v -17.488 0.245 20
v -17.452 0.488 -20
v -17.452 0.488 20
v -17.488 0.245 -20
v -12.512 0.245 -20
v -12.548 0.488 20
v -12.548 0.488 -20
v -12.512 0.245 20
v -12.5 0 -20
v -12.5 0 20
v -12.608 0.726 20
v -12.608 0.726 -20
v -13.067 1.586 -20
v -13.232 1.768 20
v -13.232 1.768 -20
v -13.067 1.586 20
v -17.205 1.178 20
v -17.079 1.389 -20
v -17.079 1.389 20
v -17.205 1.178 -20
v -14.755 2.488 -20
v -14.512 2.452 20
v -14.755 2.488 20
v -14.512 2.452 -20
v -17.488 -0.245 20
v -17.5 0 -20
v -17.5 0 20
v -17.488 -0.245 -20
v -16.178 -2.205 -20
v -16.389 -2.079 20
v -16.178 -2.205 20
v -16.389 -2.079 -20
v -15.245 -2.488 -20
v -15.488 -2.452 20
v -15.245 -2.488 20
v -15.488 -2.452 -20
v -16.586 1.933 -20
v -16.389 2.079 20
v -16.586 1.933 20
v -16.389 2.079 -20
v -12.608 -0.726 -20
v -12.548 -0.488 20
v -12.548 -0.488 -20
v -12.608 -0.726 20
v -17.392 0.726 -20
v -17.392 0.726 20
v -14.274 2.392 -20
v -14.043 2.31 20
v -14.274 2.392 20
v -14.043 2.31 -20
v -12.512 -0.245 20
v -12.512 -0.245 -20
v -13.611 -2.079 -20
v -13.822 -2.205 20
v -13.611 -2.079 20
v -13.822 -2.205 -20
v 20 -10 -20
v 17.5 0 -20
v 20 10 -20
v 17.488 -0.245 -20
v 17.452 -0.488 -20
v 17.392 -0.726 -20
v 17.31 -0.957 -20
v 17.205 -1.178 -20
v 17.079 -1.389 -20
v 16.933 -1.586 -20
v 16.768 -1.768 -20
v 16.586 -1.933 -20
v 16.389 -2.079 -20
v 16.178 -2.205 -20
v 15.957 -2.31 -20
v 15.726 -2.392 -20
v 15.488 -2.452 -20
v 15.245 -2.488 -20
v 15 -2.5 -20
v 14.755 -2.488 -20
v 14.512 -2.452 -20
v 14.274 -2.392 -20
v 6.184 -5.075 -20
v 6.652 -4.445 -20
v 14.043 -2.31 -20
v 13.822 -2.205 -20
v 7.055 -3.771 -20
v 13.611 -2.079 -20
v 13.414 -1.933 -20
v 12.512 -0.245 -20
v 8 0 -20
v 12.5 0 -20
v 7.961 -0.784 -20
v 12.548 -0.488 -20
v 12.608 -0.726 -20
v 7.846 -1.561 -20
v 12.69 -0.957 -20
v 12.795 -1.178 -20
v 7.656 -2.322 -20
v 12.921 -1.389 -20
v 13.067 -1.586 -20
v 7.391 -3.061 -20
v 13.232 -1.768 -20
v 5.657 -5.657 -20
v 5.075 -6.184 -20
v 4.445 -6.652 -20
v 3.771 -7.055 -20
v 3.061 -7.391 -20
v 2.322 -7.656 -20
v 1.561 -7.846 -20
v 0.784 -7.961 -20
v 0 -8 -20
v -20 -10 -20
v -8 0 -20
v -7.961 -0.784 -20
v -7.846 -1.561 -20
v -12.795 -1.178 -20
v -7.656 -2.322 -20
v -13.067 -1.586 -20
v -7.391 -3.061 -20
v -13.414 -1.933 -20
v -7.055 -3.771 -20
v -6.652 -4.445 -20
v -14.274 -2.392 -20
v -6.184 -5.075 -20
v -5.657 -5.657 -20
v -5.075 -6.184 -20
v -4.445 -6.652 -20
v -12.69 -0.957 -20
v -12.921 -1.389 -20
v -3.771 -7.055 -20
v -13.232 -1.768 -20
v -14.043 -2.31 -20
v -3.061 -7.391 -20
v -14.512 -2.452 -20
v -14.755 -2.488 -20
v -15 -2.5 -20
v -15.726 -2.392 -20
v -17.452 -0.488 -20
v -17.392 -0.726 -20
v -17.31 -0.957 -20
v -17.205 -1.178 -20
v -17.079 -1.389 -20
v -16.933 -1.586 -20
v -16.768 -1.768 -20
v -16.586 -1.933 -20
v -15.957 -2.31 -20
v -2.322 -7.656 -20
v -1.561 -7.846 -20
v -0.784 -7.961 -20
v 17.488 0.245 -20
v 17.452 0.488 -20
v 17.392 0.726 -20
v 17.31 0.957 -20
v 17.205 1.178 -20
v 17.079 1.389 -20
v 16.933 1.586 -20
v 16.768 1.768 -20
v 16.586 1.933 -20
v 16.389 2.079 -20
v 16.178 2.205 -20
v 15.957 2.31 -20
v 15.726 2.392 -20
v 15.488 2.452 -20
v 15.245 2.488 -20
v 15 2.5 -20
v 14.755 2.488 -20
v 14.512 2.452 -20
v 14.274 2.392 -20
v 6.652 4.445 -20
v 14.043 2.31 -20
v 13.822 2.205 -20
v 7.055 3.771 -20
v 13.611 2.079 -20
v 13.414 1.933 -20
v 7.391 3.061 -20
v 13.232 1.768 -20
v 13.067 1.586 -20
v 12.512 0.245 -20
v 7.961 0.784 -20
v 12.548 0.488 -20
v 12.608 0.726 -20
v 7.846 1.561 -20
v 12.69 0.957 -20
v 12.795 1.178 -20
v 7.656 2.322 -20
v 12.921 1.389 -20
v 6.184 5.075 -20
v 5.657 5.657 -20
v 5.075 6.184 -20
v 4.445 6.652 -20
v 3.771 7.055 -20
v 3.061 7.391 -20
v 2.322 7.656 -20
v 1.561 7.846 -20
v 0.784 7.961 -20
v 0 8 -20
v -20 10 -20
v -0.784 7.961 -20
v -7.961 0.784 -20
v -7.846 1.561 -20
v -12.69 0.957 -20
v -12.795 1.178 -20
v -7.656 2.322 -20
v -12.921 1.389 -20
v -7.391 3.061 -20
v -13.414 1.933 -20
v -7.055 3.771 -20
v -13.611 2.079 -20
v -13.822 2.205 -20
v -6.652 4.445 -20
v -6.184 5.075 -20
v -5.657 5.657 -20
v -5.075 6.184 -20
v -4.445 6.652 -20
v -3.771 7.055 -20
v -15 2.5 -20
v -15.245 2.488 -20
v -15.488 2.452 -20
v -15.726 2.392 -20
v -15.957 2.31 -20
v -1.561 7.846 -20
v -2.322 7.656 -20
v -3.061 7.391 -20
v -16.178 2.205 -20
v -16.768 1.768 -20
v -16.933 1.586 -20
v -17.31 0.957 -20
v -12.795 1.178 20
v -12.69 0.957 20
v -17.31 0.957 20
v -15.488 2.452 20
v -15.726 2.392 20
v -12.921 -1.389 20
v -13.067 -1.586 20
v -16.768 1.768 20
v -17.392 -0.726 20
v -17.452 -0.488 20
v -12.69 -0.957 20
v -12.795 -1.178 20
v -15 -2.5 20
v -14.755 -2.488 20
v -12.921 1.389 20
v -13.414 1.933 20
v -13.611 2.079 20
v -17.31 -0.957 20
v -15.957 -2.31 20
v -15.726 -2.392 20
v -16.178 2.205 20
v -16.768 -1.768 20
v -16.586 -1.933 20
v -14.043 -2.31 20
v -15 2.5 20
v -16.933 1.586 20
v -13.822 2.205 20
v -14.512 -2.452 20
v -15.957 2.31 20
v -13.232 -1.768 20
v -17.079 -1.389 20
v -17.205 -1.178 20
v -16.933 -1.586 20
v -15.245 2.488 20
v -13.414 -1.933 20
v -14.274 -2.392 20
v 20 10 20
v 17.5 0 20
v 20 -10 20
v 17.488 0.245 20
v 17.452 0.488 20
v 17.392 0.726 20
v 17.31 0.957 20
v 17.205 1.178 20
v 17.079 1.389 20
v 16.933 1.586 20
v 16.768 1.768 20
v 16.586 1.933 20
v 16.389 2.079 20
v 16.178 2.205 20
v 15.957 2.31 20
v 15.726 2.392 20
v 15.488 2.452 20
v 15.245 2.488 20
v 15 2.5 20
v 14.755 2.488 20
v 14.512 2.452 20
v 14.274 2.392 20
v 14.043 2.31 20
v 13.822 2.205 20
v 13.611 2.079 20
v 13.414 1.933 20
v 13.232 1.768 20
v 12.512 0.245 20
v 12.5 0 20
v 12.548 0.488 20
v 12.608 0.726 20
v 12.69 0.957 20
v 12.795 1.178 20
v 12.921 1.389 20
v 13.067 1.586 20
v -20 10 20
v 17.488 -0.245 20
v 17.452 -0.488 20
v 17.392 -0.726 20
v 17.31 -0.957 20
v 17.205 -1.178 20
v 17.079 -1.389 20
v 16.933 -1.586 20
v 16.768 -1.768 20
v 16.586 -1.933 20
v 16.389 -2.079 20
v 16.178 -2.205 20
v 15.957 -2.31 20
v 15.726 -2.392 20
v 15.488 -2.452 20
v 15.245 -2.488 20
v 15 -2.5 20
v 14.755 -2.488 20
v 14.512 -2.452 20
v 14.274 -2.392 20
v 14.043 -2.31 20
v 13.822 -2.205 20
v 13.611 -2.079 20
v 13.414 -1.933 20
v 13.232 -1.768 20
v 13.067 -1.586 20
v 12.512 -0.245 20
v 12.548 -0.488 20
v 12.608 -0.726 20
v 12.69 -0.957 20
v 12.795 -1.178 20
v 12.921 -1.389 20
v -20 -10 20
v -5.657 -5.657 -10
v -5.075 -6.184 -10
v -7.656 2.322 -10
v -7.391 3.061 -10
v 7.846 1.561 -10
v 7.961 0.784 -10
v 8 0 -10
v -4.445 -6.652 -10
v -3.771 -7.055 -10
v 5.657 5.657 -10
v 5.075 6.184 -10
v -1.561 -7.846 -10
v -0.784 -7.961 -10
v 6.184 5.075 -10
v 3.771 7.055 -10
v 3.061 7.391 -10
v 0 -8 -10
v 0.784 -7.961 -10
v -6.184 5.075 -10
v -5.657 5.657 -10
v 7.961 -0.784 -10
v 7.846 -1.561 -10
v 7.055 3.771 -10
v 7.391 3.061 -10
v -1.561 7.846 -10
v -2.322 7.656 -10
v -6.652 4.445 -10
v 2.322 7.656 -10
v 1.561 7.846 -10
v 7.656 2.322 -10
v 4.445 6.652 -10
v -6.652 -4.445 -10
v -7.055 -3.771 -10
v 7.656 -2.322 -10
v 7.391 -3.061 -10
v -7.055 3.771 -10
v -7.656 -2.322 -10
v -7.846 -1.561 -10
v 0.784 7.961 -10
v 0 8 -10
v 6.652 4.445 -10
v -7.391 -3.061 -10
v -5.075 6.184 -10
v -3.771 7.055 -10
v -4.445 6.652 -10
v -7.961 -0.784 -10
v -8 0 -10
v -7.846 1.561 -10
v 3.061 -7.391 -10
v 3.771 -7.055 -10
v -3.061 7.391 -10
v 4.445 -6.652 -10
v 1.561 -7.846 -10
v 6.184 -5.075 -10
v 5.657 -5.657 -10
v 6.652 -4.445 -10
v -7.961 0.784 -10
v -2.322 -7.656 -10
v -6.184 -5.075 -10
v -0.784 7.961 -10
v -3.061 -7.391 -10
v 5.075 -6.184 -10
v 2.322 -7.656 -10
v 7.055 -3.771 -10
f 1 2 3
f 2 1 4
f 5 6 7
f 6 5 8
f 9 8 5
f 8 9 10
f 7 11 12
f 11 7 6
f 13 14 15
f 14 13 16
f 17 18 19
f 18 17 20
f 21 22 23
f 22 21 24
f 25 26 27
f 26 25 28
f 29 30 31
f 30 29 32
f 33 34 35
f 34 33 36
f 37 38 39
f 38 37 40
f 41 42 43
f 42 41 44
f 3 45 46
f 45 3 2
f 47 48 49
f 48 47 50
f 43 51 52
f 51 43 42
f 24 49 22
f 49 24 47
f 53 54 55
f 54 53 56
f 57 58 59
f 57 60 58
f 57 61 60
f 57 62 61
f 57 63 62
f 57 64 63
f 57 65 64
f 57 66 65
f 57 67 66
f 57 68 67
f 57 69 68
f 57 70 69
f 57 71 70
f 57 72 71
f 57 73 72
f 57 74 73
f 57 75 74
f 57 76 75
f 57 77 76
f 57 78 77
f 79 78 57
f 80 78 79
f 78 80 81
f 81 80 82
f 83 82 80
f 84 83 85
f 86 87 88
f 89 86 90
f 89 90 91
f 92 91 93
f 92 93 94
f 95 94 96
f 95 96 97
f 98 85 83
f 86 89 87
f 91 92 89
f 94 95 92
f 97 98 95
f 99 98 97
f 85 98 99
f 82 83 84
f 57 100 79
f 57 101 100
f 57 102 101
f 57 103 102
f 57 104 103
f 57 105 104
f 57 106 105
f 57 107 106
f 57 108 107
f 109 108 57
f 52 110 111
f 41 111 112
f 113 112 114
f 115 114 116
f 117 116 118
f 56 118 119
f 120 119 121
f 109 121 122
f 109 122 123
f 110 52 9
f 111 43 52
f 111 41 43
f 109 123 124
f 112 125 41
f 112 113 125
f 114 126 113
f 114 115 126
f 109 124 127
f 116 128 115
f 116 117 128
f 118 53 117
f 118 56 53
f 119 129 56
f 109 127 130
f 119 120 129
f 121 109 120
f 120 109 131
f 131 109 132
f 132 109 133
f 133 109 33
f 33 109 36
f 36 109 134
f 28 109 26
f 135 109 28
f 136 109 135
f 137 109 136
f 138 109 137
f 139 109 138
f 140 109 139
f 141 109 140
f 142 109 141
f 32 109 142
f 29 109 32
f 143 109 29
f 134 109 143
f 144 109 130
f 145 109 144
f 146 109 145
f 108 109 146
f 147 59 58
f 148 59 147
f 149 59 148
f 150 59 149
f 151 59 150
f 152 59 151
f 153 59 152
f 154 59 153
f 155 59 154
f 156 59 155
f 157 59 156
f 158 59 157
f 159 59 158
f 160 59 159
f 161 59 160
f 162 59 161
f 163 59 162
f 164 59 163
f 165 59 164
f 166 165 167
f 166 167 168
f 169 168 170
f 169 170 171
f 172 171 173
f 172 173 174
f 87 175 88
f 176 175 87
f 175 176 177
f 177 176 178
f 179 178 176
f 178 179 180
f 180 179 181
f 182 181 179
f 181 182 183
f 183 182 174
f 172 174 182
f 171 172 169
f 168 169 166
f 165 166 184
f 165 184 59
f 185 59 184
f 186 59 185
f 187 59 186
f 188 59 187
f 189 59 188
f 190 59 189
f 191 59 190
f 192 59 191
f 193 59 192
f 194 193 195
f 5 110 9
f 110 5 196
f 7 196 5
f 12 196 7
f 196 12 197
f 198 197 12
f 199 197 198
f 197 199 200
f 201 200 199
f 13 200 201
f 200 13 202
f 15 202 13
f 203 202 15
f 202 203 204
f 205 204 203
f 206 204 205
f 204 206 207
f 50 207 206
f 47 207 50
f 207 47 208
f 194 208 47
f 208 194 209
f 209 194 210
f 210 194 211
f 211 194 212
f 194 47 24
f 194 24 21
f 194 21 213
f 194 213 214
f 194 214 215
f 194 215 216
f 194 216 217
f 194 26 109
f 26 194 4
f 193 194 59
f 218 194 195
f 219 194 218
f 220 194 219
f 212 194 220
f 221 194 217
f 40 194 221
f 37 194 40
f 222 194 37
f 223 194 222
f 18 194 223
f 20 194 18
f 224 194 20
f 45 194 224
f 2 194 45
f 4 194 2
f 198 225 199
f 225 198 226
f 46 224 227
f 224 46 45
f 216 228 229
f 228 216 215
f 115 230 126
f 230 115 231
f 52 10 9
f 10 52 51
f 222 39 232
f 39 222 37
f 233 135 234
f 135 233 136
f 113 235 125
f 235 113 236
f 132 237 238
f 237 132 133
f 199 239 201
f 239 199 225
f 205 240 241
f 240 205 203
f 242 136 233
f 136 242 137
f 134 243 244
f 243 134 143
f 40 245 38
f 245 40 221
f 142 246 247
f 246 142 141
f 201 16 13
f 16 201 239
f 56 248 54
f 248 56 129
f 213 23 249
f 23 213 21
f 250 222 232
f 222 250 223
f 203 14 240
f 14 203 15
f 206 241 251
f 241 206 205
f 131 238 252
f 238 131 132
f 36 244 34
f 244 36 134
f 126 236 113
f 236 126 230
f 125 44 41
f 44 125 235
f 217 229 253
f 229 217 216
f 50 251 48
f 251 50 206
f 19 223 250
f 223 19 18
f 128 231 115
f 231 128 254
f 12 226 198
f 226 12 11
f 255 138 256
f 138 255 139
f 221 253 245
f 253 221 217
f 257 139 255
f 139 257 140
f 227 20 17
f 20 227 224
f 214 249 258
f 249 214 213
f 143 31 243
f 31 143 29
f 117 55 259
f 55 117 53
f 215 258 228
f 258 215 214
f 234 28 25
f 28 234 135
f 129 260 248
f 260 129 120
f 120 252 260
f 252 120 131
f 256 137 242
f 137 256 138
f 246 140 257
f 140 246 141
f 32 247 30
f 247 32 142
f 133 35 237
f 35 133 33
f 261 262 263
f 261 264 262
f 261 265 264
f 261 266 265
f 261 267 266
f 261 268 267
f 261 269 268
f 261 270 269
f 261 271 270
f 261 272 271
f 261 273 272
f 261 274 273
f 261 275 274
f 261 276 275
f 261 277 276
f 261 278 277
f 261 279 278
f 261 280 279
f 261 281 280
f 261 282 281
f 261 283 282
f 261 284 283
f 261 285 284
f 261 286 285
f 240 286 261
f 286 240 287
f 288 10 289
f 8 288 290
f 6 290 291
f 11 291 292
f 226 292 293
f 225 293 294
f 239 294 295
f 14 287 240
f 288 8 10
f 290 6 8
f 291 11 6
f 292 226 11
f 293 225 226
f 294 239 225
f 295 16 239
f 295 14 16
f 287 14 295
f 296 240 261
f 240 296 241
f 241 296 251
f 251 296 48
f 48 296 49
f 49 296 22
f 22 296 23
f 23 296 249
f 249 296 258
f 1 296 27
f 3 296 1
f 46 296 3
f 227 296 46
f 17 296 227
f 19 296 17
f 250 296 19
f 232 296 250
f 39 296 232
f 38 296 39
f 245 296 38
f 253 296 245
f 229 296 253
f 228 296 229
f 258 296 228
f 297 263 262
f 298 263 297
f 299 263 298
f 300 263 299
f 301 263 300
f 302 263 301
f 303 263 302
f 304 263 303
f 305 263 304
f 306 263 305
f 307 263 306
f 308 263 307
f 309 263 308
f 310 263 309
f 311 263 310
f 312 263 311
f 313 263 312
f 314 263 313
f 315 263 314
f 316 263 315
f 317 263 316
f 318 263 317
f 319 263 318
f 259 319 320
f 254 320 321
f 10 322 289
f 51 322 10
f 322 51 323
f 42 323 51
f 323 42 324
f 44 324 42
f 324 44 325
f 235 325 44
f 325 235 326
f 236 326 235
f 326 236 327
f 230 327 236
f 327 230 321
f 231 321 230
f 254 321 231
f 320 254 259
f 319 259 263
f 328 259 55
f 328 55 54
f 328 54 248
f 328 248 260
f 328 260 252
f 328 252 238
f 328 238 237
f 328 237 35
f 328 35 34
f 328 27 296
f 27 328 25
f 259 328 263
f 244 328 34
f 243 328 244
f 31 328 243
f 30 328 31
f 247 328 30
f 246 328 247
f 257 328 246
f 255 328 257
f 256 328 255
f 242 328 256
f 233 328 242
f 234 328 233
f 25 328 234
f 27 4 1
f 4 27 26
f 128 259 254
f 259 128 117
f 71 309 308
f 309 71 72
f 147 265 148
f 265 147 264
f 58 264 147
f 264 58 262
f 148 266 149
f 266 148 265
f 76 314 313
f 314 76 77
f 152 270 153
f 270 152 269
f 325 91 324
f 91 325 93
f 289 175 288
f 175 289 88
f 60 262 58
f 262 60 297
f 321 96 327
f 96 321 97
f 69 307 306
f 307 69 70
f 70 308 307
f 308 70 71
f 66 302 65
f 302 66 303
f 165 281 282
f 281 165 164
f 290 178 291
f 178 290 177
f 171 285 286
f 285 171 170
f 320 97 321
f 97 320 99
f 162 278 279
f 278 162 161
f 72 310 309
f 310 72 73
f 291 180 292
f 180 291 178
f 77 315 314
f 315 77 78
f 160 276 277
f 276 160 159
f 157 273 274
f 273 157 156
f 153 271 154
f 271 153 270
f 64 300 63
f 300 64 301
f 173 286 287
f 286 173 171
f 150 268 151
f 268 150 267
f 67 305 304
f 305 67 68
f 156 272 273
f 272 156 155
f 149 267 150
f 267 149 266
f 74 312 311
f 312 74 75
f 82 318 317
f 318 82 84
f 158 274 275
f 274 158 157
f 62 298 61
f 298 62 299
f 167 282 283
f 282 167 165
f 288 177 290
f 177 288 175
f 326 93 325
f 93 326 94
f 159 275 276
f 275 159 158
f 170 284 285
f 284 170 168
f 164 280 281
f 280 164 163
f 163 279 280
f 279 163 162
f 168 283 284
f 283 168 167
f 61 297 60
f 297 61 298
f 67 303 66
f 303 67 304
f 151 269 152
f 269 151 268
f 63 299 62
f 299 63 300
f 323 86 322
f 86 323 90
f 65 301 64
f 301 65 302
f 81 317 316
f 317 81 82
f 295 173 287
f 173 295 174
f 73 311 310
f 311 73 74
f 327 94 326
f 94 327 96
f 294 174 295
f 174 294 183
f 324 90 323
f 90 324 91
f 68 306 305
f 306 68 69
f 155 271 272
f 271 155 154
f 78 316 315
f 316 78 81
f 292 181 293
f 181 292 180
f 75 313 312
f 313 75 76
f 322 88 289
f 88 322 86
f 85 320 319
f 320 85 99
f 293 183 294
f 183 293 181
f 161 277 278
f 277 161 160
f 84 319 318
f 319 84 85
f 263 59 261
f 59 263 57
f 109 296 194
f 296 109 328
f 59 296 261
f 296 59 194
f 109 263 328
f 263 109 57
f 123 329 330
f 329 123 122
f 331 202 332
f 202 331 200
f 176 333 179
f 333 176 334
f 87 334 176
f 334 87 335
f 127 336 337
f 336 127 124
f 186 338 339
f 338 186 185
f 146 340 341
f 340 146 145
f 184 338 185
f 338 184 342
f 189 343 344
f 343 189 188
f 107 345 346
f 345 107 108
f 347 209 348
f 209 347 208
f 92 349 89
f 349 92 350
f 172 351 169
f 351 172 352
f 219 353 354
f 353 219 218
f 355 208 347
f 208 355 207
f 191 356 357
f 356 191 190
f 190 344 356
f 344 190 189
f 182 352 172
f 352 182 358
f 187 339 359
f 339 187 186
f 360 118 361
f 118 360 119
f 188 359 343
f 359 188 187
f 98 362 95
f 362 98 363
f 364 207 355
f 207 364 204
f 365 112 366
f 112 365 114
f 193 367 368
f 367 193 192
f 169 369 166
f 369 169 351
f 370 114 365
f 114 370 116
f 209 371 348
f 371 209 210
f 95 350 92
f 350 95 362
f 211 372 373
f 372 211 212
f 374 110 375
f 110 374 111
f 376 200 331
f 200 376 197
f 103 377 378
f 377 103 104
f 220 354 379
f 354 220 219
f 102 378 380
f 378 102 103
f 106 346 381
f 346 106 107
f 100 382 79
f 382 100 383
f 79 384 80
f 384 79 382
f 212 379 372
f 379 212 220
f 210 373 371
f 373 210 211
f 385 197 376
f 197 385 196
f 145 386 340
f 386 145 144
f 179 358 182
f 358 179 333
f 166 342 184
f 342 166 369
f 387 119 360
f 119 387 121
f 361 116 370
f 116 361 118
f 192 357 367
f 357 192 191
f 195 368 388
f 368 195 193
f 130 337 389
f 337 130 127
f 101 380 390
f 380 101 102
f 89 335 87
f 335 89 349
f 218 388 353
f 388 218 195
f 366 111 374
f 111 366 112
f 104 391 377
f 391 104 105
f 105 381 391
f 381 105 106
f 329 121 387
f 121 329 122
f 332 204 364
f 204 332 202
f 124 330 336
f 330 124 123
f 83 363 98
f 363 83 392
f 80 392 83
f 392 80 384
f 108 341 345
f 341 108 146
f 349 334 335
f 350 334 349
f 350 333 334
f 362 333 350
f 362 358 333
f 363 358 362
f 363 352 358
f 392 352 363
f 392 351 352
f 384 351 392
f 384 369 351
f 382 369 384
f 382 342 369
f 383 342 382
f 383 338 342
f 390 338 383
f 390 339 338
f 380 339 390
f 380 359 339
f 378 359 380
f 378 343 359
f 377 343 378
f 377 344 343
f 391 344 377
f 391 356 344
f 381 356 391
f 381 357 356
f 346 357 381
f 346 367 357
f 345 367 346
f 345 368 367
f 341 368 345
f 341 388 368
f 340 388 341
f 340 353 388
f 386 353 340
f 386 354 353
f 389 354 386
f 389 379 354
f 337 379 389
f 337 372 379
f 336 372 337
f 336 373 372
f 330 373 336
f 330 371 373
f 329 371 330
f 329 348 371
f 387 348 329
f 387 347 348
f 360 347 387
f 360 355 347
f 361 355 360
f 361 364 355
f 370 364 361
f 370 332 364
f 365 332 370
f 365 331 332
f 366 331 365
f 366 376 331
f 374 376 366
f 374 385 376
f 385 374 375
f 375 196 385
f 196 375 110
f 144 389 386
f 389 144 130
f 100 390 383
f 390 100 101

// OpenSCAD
// Parameters
leadscrew_diameter = 8;
nut_diameter = 16;
nut_height = 10;
housing_width = 40;
housing_height = 40;
housing_depth = 20;
mount_hole_diameter = 5;
mount_hole_spacing = 30;
anti_backlash_spring_diameter = 12;
anti_backlash_spring_height = 5;

// Leadscrew nut housing
module leadscrew_nut_housing() {
    difference() {
        // Main housing block
        translate([-housing_width/2, -housing_depth/2, -housing_height/2])
            cube([housing_width, housing_depth, housing_height]);
        
        // Leadscrew hole
        translate([0, 0, -housing_height/2])
            cylinder(h=nut_height, d=nut_diameter, $fn=64);
        
        // Mounting holes
        for (x = [-mount_hole_spacing/2, mount_hole_spacing/2])
            translate([x, 0, -housing_height/2])
                cylinder(h=housing_height, d=mount_hole_diameter, $fn=64);
    }
}

// Anti-backlash spring housing
module anti_backlash_spring_housing() {
    translate([0, 0, nut_height/2])
        cylinder(h=anti_backlash_spring_height, d=anti_backlash_spring_diameter, $fn=64);
}

// Complete assembly
module leadscrew_nut_block() {
    union() {
        leadscrew_nut_housing();
        anti_backlash_spring_housing();
    }
}

// Render the leadscrew nut block
leadscrew_nut_block();
